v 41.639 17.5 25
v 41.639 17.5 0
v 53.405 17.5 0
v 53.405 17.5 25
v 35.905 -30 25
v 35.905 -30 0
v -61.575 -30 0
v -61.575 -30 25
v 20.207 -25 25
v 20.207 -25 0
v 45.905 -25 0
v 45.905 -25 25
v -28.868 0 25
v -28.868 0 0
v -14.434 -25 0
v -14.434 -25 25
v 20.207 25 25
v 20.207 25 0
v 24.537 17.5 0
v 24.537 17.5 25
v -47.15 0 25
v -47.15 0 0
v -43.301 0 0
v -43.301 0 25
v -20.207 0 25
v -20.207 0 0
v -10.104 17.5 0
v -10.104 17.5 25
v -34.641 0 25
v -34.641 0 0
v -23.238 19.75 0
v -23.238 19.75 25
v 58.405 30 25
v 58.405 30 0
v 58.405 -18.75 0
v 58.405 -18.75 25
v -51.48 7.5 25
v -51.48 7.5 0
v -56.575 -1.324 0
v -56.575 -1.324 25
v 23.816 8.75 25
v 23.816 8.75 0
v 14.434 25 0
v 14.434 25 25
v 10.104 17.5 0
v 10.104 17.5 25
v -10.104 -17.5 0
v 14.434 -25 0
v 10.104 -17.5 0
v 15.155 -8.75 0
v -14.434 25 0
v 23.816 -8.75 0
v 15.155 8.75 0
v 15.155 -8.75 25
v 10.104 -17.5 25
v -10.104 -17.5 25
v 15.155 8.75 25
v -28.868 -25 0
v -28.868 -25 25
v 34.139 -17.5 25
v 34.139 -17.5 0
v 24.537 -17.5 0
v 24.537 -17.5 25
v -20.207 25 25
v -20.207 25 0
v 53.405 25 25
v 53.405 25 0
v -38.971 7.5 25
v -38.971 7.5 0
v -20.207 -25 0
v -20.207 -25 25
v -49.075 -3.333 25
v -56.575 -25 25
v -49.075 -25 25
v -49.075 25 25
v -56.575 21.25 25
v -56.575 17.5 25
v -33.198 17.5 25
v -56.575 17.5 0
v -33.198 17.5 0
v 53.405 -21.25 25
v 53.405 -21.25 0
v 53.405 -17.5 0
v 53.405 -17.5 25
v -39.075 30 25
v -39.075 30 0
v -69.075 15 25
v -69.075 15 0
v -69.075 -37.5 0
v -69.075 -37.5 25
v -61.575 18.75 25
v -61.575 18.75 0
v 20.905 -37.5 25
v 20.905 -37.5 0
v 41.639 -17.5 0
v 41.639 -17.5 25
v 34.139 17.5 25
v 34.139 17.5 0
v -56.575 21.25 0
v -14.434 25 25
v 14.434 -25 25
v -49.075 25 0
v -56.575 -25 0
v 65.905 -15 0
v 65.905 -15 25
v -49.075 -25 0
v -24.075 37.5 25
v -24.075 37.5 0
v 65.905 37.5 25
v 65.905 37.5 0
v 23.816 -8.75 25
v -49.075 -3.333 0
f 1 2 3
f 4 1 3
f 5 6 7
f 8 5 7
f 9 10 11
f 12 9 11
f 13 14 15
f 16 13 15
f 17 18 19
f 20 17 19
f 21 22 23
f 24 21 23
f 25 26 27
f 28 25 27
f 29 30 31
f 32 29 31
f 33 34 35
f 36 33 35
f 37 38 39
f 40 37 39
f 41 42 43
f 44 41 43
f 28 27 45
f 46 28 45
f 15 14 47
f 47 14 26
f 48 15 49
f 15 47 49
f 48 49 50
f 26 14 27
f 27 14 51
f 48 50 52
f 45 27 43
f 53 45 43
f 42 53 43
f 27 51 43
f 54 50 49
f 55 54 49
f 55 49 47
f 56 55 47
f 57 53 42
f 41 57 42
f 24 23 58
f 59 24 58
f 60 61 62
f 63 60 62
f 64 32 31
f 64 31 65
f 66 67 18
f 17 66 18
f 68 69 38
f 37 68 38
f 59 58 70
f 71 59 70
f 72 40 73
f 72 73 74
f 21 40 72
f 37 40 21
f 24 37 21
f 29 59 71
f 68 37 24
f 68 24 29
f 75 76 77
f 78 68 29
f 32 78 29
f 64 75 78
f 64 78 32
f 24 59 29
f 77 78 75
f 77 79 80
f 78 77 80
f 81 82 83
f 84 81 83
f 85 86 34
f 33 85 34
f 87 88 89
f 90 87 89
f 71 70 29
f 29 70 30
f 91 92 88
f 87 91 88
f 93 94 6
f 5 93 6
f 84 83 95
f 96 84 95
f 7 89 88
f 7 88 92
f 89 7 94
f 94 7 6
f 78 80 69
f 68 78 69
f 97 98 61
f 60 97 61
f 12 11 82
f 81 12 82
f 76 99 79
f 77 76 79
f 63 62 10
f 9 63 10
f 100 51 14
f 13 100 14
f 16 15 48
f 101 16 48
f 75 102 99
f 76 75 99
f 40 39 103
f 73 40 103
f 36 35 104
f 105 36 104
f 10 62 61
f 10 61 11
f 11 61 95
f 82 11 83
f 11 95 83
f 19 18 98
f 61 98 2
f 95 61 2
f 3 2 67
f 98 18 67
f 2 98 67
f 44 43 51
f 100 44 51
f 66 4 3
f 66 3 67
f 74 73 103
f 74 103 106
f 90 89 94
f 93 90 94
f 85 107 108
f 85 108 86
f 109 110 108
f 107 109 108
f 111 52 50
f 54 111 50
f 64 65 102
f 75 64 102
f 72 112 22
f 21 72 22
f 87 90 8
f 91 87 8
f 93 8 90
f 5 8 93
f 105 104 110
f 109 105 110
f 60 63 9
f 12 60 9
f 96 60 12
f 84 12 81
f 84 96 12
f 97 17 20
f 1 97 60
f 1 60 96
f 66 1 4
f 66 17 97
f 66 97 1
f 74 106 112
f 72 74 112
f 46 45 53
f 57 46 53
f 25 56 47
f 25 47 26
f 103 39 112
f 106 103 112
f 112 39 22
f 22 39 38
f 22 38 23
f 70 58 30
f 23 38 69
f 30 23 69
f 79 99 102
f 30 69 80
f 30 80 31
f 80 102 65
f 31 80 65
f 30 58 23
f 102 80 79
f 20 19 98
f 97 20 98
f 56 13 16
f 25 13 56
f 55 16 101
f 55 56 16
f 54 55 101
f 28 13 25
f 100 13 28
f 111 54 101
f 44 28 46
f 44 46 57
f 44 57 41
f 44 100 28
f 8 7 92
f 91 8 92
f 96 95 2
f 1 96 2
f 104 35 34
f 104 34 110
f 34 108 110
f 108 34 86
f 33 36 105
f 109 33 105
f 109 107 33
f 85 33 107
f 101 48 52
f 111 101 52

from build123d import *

# Parameters (mm, degrees)
F3_DEPTH = 25


with BuildPart() as f3:
    # F2 (on Top) → F3 (new body)
    with BuildSketch(Plane.XY):
        Polygon((-69.074772, 15), (-69.074772, -37.5), (20.9049, -37.5), (35.9049, -30), (-61.574772, -30), (-61.574772, 18.75), align=None)
        Polygon((-38.971142, 7.5), (-49.074772, 7.5), (-51.480398, 7.5), (-56.574772, -1.323714), (-56.574772, -25), (-49.074772, -25), (-49.074772, -3.333333), (-47.150271, 0), (-43.301269, 0), (-28.867512, -25), (-20.207258, -25), (-34.641015, 0), (-23.238347, 19.75), (-20.207258, 25), (-49.074772, 25), (-56.574772, 21.25), (-56.574772, 17.5), (-49.074772, 17.5), (-33.197639, 17.5), align=None)
        Polygon((65.9049, -15), (65.9049, 37.5), (-24.074772, 37.5), (-39.074772, 30), (58.4049, 30), (58.4049, -18.75), align=None)
        Polygon((-28.867513, 0), (-14.433757, -25), (14.433757, -25), (23.815699, -8.75), (15.155445, -8.75), (10.10363, -17.5), (-10.10363, -17.5), (-20.207259, 0), (-10.10363, 17.5), (10.10363, 17.5), (15.155445, 8.75), (23.815699, 8.75), (14.433757, 25), (-14.433757, 25), align=None)
        Polygon((41.638611, -17.5), (41.638611, 17.5), (34.138611, 17.5), (34.138611, -17.5), (24.537386, -17.5), (20.207259, -25), (45.9049, -25), (53.4049, -21.25), (53.4049, -17.5), align=None)
        Polygon((34.138611, 17.5), (41.638611, 17.5), (53.4049, 17.5), (53.4049, 25), (20.207259, 25), (24.537386, 17.5), align=None)
    extrude(amount=F3_DEPTH)


solid = f3.part
